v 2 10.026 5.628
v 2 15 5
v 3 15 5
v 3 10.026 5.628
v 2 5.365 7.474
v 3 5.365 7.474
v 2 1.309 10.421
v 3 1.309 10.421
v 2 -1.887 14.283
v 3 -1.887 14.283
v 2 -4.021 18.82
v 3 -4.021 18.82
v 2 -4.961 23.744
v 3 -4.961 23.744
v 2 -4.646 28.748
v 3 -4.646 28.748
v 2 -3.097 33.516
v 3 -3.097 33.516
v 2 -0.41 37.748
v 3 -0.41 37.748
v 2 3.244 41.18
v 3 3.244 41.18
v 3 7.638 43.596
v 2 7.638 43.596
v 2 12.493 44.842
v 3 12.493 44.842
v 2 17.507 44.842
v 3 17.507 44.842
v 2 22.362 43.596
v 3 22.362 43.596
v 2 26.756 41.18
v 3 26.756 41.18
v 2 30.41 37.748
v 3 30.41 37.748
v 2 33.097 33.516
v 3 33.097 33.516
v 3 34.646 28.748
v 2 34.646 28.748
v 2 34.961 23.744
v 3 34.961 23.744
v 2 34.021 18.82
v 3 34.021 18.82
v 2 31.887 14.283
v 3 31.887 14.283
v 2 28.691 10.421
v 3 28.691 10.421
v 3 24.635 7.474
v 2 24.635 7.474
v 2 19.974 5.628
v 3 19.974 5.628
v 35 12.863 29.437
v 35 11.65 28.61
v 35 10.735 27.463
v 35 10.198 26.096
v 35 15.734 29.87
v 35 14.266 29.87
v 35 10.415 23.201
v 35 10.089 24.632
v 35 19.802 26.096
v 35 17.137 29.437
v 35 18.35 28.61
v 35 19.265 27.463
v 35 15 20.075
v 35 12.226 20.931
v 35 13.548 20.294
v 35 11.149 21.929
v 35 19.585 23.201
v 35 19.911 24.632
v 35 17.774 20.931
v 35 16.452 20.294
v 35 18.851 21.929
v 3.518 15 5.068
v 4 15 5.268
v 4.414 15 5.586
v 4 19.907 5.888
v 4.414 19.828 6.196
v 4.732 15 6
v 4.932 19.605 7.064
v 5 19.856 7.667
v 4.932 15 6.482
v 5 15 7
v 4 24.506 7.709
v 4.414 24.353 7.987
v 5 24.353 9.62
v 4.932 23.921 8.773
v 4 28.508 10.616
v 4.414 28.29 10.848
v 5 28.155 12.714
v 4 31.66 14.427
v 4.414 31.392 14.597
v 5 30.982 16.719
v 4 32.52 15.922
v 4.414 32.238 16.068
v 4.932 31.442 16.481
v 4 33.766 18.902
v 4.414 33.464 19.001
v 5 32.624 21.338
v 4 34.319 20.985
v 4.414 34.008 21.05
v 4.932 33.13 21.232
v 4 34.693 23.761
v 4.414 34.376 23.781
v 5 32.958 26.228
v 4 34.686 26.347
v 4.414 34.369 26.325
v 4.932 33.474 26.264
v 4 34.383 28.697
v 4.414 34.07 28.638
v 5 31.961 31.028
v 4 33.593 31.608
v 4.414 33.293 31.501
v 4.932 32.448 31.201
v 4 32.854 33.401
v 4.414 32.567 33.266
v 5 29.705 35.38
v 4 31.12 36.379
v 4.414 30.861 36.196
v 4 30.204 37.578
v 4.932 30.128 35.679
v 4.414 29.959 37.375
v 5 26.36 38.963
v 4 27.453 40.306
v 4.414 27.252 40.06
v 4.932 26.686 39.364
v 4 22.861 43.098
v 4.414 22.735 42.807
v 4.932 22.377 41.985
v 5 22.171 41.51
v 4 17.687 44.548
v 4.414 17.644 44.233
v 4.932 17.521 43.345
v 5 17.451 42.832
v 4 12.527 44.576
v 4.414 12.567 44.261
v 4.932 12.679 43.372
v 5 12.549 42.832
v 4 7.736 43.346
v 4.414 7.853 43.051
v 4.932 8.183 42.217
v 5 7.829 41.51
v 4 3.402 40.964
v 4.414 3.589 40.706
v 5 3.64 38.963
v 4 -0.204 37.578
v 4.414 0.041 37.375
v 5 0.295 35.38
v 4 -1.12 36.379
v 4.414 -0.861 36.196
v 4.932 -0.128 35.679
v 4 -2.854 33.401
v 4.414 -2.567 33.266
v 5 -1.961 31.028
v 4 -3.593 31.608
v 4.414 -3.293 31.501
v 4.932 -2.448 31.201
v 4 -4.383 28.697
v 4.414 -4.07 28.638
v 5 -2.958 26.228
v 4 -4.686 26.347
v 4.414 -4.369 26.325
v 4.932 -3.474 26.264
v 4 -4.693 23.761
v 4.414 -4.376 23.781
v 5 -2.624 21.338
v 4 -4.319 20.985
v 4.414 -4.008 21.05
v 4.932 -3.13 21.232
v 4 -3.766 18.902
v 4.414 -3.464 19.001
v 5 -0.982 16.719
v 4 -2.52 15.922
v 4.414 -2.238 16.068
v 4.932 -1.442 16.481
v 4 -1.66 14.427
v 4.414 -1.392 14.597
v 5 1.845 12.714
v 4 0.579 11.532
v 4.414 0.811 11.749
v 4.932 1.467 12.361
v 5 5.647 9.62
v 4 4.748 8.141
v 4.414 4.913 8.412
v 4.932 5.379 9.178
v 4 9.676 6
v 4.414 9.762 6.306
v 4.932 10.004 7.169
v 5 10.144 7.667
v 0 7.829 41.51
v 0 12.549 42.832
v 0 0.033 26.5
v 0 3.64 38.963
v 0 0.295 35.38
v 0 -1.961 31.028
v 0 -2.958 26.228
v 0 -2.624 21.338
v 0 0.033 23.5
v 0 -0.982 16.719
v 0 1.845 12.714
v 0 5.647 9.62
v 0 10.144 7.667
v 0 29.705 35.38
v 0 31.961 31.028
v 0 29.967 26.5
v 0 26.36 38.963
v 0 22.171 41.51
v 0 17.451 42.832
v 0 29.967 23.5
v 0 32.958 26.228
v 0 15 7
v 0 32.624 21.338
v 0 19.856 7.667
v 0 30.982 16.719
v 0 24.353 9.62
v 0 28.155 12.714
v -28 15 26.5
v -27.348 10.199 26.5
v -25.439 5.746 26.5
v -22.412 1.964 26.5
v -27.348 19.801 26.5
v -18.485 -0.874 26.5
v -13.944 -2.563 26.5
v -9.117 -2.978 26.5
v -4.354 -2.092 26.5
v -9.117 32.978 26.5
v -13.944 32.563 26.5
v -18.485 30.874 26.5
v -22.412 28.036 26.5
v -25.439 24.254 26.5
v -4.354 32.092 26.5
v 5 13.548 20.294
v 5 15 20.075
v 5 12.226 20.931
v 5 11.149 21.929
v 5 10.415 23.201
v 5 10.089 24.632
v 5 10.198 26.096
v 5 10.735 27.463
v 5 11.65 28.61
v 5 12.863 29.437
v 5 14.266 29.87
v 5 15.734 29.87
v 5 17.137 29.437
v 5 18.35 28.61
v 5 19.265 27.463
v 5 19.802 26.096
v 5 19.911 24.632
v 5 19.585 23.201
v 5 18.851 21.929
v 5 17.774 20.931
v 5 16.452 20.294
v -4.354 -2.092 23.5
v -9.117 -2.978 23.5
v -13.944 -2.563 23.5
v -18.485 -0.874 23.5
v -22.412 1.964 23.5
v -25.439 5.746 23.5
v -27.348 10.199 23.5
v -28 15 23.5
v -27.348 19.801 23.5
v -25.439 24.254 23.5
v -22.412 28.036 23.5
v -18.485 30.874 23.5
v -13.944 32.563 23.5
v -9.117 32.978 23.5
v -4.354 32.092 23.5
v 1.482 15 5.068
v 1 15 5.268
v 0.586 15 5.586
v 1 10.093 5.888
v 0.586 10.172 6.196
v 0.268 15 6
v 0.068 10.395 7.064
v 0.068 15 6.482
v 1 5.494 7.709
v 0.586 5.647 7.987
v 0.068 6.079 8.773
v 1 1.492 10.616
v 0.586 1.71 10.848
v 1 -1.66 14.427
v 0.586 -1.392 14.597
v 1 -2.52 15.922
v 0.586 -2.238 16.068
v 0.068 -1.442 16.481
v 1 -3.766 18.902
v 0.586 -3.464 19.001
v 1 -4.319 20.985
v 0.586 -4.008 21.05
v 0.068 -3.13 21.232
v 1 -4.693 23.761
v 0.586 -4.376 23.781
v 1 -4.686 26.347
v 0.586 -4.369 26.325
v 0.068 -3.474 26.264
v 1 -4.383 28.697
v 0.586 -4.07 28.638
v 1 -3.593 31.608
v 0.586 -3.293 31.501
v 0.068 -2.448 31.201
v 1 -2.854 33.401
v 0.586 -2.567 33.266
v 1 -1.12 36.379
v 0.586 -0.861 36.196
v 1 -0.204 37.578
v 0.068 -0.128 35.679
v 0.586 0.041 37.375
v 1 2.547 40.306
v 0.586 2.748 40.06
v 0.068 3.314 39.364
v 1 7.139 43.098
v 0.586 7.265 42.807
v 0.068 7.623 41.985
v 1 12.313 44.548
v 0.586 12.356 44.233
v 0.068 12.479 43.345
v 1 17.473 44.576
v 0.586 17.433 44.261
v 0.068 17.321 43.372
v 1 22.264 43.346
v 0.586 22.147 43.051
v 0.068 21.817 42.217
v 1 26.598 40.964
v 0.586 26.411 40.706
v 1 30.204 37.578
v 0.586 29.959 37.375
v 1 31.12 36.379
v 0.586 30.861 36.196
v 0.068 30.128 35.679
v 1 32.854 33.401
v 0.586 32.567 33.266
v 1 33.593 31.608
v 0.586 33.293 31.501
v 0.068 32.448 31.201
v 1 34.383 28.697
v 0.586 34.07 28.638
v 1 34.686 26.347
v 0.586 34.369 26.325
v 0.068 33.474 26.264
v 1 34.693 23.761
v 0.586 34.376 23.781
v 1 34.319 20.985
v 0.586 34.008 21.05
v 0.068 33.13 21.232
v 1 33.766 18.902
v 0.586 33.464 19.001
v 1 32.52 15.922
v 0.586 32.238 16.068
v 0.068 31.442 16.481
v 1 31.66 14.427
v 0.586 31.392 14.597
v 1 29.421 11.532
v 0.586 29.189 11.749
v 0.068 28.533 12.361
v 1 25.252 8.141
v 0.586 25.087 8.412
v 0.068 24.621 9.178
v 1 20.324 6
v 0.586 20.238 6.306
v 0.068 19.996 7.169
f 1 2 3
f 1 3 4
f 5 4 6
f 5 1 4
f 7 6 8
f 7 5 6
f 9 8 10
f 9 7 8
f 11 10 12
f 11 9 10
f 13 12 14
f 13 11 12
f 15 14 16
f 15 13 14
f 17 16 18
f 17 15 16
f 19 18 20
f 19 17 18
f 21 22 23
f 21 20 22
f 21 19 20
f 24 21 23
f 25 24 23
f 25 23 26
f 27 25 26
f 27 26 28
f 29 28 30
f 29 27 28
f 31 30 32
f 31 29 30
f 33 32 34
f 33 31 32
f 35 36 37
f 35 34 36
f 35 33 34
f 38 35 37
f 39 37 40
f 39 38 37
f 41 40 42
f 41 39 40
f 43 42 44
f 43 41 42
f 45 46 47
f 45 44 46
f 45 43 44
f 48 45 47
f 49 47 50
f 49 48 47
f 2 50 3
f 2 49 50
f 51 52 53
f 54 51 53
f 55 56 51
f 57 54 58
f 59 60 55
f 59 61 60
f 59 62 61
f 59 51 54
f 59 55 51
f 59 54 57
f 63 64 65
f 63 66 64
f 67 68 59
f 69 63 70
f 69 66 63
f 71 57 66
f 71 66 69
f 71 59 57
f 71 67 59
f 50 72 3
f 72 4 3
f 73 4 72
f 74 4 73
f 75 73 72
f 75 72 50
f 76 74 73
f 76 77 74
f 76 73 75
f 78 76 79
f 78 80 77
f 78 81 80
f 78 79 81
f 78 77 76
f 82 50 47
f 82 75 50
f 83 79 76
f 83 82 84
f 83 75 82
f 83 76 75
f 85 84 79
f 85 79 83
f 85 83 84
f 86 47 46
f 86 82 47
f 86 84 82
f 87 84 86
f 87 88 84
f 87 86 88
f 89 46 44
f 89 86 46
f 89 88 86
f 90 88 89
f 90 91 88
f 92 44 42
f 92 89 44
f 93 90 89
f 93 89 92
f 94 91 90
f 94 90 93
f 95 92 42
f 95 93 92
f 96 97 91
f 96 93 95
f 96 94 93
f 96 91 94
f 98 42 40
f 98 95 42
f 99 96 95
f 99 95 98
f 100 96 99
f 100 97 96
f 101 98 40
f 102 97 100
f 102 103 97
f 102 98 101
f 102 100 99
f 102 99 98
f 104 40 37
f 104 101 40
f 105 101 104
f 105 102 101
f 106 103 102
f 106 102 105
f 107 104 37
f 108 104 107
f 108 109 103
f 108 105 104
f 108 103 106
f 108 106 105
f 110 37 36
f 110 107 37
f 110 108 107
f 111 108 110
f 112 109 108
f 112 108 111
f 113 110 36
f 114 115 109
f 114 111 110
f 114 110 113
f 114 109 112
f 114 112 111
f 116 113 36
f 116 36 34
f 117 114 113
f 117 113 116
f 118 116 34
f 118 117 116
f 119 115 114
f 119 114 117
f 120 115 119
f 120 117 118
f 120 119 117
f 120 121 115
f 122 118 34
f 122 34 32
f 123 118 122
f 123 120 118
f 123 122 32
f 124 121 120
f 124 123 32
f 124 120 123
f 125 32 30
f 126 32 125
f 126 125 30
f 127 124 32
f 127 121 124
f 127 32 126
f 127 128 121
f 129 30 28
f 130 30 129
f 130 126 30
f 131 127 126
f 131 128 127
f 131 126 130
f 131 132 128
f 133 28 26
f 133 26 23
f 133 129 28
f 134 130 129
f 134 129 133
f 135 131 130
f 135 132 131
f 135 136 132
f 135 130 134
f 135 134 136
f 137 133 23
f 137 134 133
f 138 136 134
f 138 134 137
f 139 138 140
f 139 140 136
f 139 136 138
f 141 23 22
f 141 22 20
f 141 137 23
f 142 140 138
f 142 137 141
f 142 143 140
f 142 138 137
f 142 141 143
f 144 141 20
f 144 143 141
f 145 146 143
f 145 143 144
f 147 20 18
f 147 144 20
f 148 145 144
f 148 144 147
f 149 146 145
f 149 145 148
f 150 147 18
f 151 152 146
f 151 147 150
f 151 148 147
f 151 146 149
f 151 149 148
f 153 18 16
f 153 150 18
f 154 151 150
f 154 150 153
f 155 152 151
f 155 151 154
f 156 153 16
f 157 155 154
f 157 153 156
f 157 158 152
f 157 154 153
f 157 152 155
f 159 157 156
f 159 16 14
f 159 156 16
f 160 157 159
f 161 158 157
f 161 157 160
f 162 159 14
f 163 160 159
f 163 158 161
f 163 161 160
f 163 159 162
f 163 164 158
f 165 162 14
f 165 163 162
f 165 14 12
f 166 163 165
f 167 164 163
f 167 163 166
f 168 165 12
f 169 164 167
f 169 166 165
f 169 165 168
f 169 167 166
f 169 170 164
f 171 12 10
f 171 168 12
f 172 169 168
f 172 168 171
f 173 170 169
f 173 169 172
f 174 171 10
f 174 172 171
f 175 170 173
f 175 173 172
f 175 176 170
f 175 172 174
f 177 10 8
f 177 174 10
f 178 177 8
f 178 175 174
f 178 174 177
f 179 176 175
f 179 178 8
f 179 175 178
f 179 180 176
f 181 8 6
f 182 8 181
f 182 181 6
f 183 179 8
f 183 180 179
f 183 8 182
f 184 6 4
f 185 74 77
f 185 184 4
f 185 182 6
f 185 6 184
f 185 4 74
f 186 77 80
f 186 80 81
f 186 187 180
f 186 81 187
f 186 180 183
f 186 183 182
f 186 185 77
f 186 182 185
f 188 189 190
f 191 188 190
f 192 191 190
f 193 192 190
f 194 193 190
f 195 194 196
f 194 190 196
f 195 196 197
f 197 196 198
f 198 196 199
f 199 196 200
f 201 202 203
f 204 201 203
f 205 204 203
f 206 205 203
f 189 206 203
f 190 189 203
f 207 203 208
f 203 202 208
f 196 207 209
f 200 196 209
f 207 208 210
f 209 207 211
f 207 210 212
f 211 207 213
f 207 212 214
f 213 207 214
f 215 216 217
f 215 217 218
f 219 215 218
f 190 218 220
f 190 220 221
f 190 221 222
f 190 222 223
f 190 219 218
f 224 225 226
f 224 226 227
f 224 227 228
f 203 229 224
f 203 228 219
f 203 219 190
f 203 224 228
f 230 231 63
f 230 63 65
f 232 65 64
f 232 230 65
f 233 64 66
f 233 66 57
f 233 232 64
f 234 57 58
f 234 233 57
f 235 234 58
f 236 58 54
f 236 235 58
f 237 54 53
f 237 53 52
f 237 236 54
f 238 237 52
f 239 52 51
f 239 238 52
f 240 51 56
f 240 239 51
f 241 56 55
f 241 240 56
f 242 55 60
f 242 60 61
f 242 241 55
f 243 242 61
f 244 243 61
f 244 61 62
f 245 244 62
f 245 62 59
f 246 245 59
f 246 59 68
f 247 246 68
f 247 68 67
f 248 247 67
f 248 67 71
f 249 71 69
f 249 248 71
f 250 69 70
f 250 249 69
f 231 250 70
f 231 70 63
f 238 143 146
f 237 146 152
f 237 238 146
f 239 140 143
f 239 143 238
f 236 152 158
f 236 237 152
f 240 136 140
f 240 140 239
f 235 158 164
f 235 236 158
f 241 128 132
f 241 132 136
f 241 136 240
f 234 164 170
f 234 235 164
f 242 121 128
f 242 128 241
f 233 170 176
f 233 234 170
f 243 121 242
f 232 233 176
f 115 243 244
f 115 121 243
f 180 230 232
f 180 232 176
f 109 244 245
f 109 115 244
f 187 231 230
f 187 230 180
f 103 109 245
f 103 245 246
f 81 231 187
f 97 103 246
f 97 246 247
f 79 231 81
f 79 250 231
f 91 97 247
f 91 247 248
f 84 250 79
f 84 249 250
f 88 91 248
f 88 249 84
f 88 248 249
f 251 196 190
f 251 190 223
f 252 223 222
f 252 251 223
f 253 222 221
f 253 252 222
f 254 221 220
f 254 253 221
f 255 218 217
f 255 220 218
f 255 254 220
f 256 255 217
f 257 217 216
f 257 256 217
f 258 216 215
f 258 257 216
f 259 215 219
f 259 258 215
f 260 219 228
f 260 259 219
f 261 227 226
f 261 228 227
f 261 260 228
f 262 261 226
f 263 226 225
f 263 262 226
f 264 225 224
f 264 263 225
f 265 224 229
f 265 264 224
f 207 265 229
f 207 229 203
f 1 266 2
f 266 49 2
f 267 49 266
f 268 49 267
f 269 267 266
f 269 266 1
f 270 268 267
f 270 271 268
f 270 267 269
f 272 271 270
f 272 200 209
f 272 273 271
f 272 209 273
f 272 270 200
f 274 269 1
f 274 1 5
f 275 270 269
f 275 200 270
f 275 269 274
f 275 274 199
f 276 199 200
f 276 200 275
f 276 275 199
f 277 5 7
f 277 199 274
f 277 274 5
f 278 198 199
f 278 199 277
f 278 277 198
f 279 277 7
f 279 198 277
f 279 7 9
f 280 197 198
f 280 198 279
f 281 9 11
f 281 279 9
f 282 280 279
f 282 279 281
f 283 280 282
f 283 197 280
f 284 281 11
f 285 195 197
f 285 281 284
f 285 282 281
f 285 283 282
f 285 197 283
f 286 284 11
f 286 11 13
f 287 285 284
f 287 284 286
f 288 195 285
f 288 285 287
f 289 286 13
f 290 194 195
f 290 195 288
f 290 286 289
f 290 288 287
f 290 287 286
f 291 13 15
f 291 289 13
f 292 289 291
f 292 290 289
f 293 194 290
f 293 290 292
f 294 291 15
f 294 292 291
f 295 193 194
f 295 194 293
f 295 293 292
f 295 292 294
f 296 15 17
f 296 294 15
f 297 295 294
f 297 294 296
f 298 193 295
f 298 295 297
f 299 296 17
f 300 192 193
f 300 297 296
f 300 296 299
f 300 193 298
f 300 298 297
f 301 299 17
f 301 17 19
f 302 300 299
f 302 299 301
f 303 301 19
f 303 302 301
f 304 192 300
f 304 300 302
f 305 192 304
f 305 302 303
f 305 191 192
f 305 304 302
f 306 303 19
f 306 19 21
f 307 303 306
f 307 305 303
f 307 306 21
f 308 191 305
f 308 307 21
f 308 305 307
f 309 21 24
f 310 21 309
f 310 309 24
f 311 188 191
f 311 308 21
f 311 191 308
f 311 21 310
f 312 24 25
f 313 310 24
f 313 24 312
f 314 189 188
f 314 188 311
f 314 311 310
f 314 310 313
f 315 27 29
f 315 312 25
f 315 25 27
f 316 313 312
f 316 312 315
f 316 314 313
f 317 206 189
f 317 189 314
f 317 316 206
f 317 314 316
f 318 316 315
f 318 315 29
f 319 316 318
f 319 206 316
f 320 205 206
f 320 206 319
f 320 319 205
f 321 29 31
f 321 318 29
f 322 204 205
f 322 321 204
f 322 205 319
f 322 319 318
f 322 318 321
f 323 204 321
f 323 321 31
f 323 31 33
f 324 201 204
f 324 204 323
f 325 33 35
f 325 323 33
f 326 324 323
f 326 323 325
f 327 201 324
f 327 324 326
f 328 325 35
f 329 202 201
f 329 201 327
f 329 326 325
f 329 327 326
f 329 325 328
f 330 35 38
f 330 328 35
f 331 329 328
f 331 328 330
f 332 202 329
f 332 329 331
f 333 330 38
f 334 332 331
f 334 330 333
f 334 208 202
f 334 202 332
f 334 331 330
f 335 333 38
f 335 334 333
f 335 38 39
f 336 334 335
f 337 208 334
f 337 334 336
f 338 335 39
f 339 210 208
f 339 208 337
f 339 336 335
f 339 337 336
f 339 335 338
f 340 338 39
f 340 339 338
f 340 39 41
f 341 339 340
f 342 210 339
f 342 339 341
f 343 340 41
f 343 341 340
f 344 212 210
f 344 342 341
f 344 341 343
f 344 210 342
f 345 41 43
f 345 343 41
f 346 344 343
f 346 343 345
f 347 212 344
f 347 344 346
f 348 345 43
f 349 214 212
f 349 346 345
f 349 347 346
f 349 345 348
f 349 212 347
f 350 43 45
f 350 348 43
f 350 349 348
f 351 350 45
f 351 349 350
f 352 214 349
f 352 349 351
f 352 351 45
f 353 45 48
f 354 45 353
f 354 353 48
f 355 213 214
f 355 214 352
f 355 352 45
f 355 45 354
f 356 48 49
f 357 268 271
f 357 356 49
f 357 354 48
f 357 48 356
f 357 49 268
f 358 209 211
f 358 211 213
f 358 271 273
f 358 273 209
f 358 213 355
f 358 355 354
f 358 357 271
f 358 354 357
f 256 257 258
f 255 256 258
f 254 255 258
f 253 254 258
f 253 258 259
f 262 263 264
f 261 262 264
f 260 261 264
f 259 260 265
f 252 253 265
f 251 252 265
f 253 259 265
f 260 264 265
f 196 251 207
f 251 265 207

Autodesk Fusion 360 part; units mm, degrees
sketch "Sketch1" plane through (0, 0, 0) normal (1, 0, 0) x (0, 0, -1)
  circle A0 centre (-25, 15) radius 20
  dimension "d1" = 40
extrude "Extrude1" add sketch "Sketch1" along normal blind 5
fillet "Fillet1" radius 2 1 edges at (5, 7.7677, 43.6465)
fillet "Fillet2" radius 2 1 edges at (0, 7.7677, 43.6465)
sketch "Sketch2" plane through (5, 0, 0) normal (1, 0, 0) x (0, 0, -1)
  circle A0 centre (-25, 15) radius 18
  circle A1 centre (-25, 15) radius 5
  dimension "d6" = 10
extrude "Extrude2" add sketch "Sketch2" along normal blind 30 contours A1
thread "Thread1" "ISO Metric profile 10.0 M10x1.5 6g" major diameter 9.85 minor diameter 8.141 pitch 1.5 angle 60 resizes the face on face at (25, 14.5022, 20.0248)
sketch "Sketch3" plane through (0, 0, 0) normal (1, 0, 0) x (0, 0, -1)
sketch "Sketch4" plane through (0, 0, 0) normal (-1, 0, 0) x (0, 0, 1)
  circle A0 centre (25, 15) radius 18
sketch "Sketch5" plane through (0, 0, 0) normal (0, 0, 1) x (1, 0, 0)
sketch "Sketch6" plane through (0, 0, 0) normal (0, 0, 1) x (1, 0, 0)
  line L0 (-10, 15) -> (50, 15)
  line L1 (0, 0) -> (0, 29.9666)
  arc A0 (0, 29.9666) -> (0, 0.0334) centre (-10, 15) ccw
  dimension "d9" = 36
extrude "Extrude3" add sketch "Sketch6" along normal blind 3 from surface at 23.5
